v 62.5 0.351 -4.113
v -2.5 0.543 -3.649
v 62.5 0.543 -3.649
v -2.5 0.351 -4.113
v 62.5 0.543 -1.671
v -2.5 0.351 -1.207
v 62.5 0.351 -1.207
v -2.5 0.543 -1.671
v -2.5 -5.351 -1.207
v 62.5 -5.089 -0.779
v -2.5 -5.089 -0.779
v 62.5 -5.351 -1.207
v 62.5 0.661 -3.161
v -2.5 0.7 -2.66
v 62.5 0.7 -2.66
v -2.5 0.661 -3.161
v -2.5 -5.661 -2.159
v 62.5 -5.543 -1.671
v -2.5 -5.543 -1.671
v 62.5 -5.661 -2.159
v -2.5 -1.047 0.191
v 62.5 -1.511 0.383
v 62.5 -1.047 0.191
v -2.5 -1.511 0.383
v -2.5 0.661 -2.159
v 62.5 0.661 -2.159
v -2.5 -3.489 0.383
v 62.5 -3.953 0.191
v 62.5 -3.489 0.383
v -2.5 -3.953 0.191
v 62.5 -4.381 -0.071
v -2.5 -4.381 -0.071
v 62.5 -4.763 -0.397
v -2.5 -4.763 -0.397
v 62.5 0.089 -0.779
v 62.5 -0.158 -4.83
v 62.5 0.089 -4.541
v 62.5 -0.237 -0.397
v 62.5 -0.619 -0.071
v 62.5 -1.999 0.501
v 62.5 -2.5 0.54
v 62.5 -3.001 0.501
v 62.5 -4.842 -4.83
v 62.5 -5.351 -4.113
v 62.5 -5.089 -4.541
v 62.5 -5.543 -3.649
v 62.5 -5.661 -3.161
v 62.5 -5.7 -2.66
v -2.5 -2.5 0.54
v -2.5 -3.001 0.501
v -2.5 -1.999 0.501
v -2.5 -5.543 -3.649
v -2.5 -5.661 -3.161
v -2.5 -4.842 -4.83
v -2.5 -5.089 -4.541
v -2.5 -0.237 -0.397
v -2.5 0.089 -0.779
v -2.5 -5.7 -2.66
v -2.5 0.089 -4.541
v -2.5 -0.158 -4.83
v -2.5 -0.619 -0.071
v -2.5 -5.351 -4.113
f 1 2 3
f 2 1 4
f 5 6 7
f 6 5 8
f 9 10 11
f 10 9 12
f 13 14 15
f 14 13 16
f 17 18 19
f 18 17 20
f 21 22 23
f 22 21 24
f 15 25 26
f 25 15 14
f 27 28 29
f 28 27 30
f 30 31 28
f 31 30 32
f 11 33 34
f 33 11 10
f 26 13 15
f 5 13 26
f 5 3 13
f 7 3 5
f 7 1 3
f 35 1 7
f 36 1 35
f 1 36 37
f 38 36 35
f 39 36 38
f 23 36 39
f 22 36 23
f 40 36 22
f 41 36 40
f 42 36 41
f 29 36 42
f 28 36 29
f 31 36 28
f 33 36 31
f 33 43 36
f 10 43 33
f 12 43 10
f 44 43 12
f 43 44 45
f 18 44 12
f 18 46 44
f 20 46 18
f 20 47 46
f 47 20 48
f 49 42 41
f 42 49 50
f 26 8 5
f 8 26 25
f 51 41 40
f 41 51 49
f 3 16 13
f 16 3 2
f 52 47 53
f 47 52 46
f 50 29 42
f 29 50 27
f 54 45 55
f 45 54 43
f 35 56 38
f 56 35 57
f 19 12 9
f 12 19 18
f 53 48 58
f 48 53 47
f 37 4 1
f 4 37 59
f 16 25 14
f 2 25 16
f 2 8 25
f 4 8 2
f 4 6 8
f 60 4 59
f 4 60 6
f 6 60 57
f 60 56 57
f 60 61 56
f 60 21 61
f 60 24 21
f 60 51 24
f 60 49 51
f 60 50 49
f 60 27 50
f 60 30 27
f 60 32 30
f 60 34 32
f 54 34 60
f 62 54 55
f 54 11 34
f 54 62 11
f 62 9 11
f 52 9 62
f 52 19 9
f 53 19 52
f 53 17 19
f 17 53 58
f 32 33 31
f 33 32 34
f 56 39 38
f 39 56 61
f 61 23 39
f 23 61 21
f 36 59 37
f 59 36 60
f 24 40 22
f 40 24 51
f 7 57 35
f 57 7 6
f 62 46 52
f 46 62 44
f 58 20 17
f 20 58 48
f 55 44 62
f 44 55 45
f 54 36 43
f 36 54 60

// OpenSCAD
render(2) rotate([90,0,0]) union() {
	intersection() {
			linear_extrude(5) resize([60,0,0],auto=true) import("matthew.dxf");
		translate([-1,5.75,2.4]) scale([1,3,1]) rotate([0,90,0])cylinder(r=2.2,h=62,$fn=70);
	}

	difference() {
		translate([-2.5,-2.66,2.5]) rotate([0,90,0]) cylinder(h=65,r=3.2,$fn=40);
		translate([-3,-11.83,-1]) cube([66,7,7]);
	}
}
